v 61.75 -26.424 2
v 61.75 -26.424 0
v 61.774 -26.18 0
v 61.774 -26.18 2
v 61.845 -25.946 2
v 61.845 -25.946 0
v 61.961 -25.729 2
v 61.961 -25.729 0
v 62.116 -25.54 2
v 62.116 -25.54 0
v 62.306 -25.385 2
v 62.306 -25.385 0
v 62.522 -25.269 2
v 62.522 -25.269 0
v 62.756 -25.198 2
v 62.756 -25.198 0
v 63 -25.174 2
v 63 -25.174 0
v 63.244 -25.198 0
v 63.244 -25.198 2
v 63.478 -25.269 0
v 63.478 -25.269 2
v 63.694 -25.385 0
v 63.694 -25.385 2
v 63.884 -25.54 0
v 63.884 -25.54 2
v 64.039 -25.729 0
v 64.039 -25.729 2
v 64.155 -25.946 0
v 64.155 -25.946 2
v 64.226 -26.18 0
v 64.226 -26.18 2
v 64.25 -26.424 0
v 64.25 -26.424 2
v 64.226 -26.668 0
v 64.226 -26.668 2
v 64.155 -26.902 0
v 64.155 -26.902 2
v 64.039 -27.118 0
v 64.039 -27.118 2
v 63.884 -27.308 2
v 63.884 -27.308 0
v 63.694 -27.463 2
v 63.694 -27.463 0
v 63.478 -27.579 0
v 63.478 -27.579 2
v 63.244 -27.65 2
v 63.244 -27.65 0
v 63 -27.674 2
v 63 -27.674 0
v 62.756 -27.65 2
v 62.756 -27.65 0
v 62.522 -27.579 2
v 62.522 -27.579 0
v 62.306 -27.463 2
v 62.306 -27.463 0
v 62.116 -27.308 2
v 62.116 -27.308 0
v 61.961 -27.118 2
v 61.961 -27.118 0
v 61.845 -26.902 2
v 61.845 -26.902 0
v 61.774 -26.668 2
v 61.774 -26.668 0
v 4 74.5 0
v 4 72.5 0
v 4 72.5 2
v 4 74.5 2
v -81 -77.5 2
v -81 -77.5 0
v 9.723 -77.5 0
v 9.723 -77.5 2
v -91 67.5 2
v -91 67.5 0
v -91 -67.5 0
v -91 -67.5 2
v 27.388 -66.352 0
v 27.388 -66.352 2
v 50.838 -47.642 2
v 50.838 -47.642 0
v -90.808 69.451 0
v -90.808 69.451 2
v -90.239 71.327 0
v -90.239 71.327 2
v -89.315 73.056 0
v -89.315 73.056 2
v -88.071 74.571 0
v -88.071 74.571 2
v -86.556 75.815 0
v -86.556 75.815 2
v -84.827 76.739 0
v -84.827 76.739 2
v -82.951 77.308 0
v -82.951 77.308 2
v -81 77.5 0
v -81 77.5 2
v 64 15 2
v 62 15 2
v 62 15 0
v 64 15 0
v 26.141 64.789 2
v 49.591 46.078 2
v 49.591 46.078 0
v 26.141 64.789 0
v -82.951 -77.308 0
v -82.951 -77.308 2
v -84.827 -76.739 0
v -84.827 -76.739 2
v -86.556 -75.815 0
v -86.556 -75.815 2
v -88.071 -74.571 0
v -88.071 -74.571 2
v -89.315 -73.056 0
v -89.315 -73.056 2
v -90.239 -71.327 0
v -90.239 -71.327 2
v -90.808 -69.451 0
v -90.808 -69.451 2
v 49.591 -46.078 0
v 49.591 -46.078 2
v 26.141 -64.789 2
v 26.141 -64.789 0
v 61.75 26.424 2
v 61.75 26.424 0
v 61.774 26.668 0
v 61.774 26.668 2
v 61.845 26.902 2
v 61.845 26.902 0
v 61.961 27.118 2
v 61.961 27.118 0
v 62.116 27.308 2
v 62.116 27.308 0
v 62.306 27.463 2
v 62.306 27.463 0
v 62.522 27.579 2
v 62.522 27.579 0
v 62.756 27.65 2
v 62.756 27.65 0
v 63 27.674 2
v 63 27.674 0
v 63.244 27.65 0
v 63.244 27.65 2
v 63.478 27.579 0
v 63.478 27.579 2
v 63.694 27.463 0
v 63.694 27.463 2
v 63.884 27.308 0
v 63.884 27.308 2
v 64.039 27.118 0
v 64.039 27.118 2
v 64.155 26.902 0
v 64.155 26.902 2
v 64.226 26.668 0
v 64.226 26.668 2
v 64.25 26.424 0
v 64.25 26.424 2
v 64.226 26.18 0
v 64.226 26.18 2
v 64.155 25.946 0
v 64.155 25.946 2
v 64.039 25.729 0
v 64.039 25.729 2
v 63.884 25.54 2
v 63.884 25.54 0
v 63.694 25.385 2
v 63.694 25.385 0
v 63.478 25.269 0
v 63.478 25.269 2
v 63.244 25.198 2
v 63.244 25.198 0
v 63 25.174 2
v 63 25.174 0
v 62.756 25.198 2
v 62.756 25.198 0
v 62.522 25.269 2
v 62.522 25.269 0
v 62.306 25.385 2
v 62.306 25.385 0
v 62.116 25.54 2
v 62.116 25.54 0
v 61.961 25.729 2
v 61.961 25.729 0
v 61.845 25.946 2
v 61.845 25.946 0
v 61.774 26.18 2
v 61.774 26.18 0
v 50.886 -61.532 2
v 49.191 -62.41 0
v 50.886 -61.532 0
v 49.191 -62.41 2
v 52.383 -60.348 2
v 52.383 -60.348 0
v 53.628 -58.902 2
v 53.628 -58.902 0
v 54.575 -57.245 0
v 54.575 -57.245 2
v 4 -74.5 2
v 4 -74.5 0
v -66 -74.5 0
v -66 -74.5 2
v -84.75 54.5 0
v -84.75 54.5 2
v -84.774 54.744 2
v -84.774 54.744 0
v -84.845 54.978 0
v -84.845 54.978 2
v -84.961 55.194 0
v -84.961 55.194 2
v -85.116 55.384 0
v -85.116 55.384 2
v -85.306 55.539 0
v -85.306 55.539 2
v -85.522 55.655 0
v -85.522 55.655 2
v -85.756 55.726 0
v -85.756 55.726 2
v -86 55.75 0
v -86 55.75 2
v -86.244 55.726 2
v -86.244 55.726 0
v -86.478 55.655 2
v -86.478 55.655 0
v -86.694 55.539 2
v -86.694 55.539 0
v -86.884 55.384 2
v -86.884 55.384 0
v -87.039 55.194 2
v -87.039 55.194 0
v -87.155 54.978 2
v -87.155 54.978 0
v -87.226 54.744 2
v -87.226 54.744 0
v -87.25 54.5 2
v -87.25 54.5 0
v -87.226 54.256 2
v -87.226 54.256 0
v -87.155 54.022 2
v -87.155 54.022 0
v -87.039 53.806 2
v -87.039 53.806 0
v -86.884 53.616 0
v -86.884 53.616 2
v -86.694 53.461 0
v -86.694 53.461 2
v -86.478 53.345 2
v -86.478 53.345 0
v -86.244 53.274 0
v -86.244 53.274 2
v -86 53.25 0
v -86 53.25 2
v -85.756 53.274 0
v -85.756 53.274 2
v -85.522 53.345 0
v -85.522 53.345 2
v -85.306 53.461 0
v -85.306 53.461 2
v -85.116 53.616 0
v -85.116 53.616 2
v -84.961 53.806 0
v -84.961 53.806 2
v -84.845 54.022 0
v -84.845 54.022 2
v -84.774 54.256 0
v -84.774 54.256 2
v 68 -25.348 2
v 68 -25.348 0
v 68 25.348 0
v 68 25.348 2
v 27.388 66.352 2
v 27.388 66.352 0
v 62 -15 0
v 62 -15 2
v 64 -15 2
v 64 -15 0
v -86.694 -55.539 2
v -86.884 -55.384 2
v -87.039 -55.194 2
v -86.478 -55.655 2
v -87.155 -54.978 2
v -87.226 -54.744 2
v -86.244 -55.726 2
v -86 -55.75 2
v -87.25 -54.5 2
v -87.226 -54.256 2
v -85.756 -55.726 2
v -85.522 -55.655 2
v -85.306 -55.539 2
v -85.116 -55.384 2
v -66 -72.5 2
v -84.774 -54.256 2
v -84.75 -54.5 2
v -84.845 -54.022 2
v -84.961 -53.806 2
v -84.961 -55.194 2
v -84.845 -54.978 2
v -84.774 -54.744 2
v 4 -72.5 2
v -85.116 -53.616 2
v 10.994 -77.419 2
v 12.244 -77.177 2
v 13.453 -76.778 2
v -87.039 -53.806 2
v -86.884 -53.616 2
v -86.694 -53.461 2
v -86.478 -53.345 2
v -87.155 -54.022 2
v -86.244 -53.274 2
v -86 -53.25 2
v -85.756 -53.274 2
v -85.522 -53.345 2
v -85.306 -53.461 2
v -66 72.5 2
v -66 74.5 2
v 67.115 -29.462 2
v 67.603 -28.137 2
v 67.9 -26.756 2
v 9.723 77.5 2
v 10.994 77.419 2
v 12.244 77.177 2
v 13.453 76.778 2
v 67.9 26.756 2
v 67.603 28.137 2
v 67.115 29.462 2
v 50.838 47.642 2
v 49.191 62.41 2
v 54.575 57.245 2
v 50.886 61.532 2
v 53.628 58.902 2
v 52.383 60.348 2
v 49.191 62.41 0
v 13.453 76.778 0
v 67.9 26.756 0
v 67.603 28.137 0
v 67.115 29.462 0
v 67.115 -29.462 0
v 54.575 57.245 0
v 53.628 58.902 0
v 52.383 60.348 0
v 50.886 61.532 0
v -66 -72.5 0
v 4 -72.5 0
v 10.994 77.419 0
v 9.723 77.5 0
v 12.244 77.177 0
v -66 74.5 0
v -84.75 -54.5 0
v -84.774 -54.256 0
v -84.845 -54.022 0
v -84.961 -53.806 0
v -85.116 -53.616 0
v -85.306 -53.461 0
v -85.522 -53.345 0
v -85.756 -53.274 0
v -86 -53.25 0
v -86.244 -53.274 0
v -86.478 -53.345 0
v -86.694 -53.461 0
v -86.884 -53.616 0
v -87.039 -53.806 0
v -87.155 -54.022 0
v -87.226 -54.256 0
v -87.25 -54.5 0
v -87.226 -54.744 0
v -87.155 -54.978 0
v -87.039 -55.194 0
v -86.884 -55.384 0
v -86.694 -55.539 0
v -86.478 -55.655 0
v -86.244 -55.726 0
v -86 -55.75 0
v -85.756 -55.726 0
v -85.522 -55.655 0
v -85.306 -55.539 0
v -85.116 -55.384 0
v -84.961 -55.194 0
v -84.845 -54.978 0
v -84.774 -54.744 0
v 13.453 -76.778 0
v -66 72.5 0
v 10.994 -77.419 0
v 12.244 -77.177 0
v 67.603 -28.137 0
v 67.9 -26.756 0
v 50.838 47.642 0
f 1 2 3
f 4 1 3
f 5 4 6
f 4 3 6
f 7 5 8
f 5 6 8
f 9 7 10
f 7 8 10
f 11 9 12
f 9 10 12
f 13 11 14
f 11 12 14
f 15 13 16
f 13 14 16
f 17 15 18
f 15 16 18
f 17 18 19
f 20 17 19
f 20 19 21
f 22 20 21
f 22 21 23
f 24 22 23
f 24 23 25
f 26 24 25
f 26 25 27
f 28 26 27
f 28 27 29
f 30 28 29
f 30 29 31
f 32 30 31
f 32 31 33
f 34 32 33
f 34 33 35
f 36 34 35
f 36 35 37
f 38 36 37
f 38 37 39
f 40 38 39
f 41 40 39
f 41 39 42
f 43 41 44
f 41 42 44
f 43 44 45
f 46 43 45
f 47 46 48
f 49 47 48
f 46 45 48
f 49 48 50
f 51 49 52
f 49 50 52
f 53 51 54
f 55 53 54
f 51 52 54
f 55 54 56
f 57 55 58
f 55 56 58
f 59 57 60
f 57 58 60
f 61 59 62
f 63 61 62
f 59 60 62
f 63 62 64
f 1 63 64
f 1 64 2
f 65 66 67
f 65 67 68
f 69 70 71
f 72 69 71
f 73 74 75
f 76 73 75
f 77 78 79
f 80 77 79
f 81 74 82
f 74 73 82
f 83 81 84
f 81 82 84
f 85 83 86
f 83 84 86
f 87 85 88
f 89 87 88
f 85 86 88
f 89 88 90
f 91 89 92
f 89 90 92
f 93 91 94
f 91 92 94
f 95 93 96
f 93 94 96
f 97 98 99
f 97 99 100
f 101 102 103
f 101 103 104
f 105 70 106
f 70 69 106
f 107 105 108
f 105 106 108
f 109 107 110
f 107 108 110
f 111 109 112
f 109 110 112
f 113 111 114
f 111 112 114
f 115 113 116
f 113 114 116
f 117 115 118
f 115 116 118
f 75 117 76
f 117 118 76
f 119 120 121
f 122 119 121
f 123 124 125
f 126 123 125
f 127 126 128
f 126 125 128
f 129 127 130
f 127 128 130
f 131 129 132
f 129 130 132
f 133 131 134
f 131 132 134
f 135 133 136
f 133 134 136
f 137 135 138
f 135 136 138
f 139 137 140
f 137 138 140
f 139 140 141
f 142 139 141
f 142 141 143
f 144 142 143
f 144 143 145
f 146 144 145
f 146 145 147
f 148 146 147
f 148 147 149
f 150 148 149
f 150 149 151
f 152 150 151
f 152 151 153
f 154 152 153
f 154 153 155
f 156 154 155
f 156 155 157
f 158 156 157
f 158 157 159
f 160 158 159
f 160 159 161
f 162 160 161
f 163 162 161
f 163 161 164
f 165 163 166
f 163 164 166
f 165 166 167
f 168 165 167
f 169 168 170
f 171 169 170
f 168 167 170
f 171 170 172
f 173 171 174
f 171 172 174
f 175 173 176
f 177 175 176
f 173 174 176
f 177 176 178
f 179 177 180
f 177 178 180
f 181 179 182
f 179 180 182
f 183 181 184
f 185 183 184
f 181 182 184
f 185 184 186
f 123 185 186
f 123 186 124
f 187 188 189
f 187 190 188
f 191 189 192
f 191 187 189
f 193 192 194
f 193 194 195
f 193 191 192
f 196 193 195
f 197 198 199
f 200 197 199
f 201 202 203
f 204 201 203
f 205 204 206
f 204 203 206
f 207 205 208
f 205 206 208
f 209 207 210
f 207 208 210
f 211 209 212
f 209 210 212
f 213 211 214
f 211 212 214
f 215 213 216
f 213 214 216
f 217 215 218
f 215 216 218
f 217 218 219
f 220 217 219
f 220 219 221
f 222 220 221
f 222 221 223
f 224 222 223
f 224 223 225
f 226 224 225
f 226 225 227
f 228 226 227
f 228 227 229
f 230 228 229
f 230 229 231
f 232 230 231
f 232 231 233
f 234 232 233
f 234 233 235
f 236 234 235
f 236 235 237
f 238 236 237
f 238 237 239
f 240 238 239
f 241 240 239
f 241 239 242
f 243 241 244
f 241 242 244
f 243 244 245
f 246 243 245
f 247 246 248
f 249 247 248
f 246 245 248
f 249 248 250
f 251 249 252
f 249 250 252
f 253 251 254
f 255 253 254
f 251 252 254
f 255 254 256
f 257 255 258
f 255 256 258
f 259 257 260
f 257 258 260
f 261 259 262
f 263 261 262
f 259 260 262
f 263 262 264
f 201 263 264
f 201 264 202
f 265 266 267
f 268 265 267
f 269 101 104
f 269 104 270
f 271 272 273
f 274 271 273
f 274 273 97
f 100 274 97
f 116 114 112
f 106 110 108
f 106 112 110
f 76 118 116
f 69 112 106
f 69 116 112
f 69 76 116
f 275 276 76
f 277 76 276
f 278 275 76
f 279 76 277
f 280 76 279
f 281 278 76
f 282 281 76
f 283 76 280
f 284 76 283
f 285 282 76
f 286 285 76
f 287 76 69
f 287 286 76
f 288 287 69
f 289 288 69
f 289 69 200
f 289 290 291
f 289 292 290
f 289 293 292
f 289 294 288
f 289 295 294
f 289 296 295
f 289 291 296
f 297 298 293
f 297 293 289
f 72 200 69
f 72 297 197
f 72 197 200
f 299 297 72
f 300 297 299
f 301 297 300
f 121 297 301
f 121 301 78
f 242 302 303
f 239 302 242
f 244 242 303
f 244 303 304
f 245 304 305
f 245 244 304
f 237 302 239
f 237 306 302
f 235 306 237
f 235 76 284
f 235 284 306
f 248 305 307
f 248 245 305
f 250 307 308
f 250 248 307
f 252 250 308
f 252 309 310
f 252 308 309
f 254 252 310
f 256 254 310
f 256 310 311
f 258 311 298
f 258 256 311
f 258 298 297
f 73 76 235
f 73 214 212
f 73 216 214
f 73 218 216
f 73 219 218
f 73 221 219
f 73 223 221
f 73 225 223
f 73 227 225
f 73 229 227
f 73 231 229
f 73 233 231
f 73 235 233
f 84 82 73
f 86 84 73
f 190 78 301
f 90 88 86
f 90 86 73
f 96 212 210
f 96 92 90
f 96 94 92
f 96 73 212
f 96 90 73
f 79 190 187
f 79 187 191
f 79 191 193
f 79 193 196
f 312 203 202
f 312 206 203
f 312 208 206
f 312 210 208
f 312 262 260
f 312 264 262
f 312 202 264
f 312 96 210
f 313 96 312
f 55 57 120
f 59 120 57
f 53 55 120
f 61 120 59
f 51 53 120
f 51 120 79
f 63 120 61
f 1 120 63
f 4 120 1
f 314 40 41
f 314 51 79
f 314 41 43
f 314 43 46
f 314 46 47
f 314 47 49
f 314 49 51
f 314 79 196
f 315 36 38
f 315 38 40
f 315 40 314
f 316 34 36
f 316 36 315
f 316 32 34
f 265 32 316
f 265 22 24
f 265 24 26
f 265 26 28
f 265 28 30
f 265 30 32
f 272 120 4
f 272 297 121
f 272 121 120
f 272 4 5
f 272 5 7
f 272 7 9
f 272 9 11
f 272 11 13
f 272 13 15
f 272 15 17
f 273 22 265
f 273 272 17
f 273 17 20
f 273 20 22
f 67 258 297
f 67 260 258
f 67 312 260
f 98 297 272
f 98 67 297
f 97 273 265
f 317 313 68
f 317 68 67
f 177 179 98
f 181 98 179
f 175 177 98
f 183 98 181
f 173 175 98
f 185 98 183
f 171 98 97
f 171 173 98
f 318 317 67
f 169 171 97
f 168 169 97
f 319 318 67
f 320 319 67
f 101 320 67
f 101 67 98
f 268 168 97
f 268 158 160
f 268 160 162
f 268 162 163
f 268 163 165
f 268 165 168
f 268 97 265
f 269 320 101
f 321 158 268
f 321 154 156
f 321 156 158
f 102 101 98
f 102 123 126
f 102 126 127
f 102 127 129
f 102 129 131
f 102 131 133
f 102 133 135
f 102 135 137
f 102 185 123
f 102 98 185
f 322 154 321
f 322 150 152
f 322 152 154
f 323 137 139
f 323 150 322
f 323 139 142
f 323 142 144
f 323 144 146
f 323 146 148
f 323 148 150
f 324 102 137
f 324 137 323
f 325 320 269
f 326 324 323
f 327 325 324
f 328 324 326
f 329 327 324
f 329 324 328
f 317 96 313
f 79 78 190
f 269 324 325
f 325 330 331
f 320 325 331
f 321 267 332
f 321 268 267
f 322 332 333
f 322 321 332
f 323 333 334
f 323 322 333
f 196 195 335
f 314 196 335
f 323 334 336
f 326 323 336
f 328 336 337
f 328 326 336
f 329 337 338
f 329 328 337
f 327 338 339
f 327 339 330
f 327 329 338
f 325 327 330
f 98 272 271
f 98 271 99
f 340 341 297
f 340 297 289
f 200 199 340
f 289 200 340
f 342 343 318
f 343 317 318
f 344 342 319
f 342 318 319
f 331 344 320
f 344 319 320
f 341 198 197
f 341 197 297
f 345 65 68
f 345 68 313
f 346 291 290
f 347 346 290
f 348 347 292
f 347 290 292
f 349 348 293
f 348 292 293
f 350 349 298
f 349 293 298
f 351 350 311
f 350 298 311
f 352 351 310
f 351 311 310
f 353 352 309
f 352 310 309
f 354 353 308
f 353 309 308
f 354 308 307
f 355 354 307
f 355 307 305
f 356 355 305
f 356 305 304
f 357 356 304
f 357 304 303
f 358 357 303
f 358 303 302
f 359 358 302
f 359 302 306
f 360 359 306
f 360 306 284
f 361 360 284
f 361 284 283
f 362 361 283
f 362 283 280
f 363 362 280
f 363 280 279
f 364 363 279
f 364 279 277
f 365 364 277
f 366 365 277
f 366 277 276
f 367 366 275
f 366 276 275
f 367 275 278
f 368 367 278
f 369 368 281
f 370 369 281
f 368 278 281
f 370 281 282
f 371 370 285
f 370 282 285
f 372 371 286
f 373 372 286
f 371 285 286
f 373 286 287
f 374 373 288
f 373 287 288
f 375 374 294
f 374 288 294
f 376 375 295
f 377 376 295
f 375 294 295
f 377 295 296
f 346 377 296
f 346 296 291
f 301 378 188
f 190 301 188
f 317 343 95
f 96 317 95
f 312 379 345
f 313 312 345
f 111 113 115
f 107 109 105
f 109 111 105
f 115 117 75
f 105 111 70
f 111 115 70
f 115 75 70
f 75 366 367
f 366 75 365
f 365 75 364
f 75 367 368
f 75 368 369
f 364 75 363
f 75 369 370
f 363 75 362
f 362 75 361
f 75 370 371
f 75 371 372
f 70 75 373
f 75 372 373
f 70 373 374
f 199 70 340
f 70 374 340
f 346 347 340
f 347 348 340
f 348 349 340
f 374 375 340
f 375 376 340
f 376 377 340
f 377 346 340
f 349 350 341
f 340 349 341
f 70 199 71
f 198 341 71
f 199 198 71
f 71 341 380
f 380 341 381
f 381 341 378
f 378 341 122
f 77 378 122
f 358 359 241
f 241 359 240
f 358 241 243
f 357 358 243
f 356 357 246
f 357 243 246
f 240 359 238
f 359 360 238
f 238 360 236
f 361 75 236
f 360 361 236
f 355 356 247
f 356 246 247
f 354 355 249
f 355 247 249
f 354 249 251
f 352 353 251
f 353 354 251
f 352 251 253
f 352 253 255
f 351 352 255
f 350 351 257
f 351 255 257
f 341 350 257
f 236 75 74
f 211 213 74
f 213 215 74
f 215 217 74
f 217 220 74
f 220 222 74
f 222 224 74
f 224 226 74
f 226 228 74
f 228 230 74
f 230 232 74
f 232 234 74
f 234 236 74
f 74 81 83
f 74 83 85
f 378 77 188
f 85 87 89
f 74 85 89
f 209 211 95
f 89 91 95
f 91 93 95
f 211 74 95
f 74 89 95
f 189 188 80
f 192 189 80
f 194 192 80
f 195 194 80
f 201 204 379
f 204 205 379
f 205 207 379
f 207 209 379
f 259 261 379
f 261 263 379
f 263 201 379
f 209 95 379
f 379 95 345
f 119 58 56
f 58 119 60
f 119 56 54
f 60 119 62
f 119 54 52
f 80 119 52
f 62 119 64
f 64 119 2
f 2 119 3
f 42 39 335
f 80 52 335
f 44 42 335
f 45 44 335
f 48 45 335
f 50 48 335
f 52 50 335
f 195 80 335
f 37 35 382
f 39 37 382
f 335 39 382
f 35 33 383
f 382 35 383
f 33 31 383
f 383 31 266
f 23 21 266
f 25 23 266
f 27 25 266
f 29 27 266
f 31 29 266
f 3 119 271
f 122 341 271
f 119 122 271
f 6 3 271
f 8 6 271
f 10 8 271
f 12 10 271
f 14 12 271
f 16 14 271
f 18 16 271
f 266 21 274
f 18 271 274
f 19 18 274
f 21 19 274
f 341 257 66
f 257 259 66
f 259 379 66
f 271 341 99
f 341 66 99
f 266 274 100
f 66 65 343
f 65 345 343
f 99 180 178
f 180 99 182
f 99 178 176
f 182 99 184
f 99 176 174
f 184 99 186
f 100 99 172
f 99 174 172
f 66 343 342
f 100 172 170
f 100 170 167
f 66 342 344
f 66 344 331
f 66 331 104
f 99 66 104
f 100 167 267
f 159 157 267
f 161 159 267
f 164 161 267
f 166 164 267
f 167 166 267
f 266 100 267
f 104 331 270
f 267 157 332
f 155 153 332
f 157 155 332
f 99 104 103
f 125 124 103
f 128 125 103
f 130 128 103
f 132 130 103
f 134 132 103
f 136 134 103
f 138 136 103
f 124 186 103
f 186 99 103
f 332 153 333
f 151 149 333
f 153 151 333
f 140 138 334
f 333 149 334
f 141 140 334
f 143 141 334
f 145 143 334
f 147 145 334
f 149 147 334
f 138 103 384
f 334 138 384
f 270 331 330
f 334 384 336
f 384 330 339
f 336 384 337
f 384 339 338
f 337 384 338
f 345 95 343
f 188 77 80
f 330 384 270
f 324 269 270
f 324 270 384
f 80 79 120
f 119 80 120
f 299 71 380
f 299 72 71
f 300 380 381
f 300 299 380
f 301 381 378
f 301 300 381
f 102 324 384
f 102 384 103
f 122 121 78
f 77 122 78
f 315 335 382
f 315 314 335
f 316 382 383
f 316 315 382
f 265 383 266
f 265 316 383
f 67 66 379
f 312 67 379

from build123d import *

# Parameters (mm, degrees)
ESTRUSIONE_ESTRUSIONE1_DEPTH = 2
FORO_FILETTATO_M3X0_5_1_D    = 2.5
SCHIZZO4_W                   = 70
SCHIZZO4_H                   = 2
TAGLIO_ESTRUSIONE1_DEPTH     = 10
FORO_FILETTATO_M3X0_5_2_D    = 2.5
SCHIZZO7_W                   = 2
SCHIZZO7_H                   = 30
TAGLIO_ESTRUSIONE2_DEPTH     = 10
RACCORDO1_R                  = 10
RACCORDO2_R                  = 10


with BuildPart() as part:
    # Schizzo1 → Estrusione-Estrusione1 (new body)
    with BuildSketch(Plane.XY):
        Polygon((11.657840491, -77.5), (52.921246524, -60.909710617), (68, -27.5), (68, 27.5), (52.921246524, 60.909710617), (11.657840491, 77.5), (-91, 77.5), (-91, -77.5), align=None)
    extrude(amount=ESTRUSIONE_ESTRUSIONE1_DEPTH)

    # Foro filettato M3x0.5-1 (through all)
    with Locations(Plane(origin=(0, 0, 0), x_dir=(-1, 0, 0), z_dir=(0, 0, -1))):
        with Locations((86, -54.5), (86, 54.5)):
            Hole(FORO_FILETTATO_M3X0_5_1_D / 2)

    # Schizzo4 → Taglio-Estrusione1 (cut)
    with BuildSketch(Plane(origin=(0, 0, 0), x_dir=(-1, 0, 0), z_dir=(0, 0, -1))):
        with Locations((31, -73.5)):
            Rectangle(SCHIZZO4_W, SCHIZZO4_H)
        with Locations((31, 73.5)):
            Rectangle(SCHIZZO4_W, SCHIZZO4_H)
    extrude(amount=-TAGLIO_ESTRUSIONE1_DEPTH, mode=Mode.SUBTRACT)

    # Foro filettato M3x0.5-2 (through all)
    with Locations(Plane.XY.offset(2)):
        with Locations((63, 26.42393853), (63, -26.42393853)):
            Hole(FORO_FILETTATO_M3X0_5_2_D / 2)

    # Schizzo7 → Taglio-Estrusione2 (cut)
    with BuildSketch(Plane.XY.offset(2)):
        Polygon((27.388202482, 66.352391197), (50.838277007, 47.641592048), (49.590890397, 46.078253746), (26.140815873, 64.789052895), align=None)
        Polygon((49.590890397, -46.078253746), (26.140815873, -64.789052895), (27.388202482, -66.352391197), (50.838277007, -47.641592048), align=None)
        with Locations((63, 0)):
            Rectangle(SCHIZZO7_W, SCHIZZO7_H)
    extrude(amount=-TAGLIO_ESTRUSIONE2_DEPTH, mode=Mode.SUBTRACT)

    # Raccordo1
    raccordo1_edges = [part.edges().sort_by_distance(p)[0] for p in [
        (-91, 77.5, 1),
        (-91, -77.5, 1),
    ]]
    fillet(raccordo1_edges, radius=RACCORDO1_R)

    # Raccordo2
    raccordo2_edges = [part.edges().sort_by_distance(p)[0] for p in [
        (11.657840491, 77.5, 1),
        (52.921246524, 60.909710617, 1),
        (68, 27.5, 1),
        (68, -27.5, 1),
        (52.921246524, -60.909710617, 1),
        (11.657840491, -77.5, 1),
    ]]
    fillet(raccordo2_edges, radius=RACCORDO2_R)


solid = part.part
